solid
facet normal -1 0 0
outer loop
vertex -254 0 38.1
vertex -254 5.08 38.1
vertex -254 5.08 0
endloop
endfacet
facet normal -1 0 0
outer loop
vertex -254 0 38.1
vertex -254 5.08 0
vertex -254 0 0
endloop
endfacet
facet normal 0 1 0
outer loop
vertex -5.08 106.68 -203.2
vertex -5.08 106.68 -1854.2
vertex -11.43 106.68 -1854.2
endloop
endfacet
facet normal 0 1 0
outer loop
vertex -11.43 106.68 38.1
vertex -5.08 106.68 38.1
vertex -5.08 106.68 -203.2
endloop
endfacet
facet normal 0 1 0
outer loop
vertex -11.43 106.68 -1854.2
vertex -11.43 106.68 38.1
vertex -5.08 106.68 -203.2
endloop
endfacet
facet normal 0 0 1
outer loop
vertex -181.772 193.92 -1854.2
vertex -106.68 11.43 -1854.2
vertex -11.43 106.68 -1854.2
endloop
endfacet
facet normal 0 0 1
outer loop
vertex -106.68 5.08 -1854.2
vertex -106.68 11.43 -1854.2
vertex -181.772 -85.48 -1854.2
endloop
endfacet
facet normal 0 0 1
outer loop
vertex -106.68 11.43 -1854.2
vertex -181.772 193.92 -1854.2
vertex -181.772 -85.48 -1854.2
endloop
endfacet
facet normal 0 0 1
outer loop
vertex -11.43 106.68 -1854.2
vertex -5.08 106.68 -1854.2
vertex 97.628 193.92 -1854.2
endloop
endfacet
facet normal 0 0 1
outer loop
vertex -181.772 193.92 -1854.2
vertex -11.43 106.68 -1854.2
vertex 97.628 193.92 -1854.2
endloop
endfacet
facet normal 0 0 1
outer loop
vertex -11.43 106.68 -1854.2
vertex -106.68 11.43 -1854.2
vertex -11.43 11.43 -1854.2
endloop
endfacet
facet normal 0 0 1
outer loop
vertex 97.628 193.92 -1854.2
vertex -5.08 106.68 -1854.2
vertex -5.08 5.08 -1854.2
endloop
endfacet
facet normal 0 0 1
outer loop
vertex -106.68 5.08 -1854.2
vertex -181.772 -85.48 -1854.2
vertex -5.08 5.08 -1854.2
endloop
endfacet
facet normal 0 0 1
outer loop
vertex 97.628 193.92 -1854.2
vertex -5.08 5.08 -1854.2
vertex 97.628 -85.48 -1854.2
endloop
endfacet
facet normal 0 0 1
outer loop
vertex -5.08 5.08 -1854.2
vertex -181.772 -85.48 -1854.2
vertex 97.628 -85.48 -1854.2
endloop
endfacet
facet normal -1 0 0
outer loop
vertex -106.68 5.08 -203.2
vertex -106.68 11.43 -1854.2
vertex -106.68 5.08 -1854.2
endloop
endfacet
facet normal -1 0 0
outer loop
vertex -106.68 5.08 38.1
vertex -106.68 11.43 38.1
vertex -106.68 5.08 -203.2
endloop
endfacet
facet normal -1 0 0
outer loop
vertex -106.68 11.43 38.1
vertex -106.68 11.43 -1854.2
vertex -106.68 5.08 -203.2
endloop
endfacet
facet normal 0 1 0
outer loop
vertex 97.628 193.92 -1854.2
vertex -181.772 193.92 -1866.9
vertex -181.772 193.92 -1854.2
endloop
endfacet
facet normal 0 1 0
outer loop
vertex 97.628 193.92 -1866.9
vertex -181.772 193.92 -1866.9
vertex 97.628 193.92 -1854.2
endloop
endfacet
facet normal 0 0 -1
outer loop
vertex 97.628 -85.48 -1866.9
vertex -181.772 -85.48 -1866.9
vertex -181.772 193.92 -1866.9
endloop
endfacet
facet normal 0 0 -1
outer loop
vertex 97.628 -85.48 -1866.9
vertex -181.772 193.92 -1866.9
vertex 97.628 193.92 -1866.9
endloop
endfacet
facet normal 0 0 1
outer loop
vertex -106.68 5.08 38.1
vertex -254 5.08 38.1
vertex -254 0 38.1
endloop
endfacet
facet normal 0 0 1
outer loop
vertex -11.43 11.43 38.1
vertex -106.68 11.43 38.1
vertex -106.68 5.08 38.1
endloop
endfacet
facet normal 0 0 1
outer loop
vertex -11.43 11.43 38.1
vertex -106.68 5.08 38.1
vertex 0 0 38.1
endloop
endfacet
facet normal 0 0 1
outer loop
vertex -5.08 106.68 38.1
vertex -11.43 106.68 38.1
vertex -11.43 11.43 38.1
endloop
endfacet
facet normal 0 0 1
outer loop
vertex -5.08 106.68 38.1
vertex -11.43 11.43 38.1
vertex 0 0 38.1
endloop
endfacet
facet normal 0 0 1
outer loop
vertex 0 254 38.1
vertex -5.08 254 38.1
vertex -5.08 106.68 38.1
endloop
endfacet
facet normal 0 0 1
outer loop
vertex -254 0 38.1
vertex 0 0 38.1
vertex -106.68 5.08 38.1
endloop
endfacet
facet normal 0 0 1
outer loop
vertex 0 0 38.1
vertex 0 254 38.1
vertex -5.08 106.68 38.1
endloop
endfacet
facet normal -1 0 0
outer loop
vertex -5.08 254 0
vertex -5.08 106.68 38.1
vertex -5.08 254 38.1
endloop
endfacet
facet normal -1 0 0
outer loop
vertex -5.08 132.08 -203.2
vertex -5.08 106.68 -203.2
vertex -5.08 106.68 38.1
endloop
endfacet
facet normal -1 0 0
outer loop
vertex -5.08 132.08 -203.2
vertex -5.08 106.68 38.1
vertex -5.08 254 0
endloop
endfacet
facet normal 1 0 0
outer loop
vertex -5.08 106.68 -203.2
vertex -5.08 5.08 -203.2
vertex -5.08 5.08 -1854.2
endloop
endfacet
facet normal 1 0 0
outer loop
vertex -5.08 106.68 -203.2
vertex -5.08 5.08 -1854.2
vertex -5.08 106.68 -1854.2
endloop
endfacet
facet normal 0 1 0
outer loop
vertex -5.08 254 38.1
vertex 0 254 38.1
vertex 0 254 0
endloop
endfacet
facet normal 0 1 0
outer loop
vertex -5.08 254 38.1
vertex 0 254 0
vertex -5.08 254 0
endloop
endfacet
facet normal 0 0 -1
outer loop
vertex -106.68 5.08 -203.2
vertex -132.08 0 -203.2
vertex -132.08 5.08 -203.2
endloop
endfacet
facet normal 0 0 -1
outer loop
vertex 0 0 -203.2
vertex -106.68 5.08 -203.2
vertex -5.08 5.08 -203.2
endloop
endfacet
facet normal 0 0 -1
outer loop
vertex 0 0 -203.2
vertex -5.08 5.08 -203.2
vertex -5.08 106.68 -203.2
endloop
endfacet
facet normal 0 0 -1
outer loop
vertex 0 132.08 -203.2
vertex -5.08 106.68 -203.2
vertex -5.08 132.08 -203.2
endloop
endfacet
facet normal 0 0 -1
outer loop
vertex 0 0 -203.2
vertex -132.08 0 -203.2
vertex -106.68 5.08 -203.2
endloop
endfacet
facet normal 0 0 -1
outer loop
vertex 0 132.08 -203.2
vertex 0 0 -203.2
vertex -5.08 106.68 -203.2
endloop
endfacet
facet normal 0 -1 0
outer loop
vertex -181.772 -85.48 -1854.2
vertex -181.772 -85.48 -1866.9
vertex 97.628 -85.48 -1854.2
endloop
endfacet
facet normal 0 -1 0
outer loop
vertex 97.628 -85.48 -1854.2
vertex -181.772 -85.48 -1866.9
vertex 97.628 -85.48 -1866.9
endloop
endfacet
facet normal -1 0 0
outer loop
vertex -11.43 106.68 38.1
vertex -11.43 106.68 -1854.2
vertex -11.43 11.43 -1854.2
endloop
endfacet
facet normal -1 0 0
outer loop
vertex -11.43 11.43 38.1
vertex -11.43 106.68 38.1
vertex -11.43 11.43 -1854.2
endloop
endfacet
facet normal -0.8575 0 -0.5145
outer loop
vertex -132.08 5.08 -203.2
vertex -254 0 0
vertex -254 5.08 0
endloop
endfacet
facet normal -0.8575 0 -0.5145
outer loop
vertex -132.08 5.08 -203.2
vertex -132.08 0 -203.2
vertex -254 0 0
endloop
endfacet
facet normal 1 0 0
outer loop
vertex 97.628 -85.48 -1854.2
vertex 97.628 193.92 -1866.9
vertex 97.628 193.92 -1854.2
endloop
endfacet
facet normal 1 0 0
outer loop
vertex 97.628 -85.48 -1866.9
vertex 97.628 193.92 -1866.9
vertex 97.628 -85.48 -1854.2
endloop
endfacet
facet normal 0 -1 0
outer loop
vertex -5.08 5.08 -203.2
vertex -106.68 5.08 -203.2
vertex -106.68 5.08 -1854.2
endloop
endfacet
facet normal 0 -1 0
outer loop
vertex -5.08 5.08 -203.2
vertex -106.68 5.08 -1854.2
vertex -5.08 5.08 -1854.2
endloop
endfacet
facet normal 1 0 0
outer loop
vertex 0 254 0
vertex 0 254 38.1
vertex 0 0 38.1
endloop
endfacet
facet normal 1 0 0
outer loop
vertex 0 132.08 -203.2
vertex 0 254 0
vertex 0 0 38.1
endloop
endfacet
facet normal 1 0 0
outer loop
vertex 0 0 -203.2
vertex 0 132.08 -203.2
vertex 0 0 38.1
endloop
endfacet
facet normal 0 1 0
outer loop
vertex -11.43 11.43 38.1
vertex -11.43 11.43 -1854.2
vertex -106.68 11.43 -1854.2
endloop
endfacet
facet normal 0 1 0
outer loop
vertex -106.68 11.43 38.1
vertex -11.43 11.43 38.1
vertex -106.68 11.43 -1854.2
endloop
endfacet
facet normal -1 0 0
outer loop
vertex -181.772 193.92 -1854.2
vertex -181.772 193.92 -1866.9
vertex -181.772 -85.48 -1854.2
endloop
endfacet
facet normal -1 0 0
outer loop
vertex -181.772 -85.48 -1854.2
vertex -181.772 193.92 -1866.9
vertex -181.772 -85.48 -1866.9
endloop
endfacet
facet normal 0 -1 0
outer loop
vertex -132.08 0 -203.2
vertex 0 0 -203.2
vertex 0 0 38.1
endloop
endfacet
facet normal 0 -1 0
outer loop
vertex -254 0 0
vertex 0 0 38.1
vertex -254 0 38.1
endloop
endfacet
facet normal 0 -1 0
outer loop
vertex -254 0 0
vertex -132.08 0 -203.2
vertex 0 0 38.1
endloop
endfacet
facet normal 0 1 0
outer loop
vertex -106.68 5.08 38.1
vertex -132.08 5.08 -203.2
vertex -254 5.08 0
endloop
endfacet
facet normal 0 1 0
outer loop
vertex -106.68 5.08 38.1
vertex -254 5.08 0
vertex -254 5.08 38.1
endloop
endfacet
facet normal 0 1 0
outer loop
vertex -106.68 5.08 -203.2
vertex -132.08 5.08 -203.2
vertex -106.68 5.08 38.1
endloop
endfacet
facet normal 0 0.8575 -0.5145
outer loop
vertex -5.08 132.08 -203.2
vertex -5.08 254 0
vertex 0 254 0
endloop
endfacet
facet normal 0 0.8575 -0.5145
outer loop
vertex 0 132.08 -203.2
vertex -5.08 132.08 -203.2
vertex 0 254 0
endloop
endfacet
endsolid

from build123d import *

# Parameters (mm, degrees)
F1_DEPTH = 38.1
F6_DEPTH = 1905
F7_W     = 279.4
F7_H     = 279.4
F8_DEPTH = 12.7


with BuildPart() as f1:
    # F0 (on Top) → F1 (new body)
    with BuildSketch(Plane.XY):
        Polygon((-254, 0), (0, 0), (0, 254), (-5.08, 254), (-5.08, 5.08), (-254, 5.08), align=None)
    extrude(amount=F1_DEPTH)

    # F1_face (on face) → F4 section 0
    with BuildSketch(Plane(origin=(-65.398586, 65.398586, 0), x_dir=(1, 0, 0), z_dir=(0, 0, -1))):
        Polygon((65.398586, 65.398586), (-188.601414, 65.398586), (-188.601414, 60.318586), (60.318586, 60.318586), (60.318586, -188.601414), (65.398586, -188.601414), align=None)
    # F3 (on offset) → F4 section 1
    with BuildSketch(Plane.XY.offset(-203.2)):
        Polygon((-132.08, 0), (0, 0), (0, 132.08), (-5.08, 132.08), (-5.08, 5.08), (-132.08, 5.08), align=None)
    loft()

    # F5 (on face) → F6 (join)
    with BuildSketch(Plane.XY.offset(38.1)):
        Polygon((-106.68, 5.08), (-5.08, 5.08), (-5.08, 106.68), (-11.43, 106.68), (-11.43, 11.43), (-106.68, 11.43), align=None)
    extrude(amount=-F6_DEPTH)

    # F7 (on face) → F8 (join)
    with BuildSketch(Plane(origin=(0, 0, -1866.9), x_dir=(1, 0, 0), z_dir=(0, 0, -1))):
        with Locations((-42.072112, -54.21998)):
            Rectangle(F7_W, F7_H)
    extrude(amount=-F8_DEPTH)


solid = f1.part
